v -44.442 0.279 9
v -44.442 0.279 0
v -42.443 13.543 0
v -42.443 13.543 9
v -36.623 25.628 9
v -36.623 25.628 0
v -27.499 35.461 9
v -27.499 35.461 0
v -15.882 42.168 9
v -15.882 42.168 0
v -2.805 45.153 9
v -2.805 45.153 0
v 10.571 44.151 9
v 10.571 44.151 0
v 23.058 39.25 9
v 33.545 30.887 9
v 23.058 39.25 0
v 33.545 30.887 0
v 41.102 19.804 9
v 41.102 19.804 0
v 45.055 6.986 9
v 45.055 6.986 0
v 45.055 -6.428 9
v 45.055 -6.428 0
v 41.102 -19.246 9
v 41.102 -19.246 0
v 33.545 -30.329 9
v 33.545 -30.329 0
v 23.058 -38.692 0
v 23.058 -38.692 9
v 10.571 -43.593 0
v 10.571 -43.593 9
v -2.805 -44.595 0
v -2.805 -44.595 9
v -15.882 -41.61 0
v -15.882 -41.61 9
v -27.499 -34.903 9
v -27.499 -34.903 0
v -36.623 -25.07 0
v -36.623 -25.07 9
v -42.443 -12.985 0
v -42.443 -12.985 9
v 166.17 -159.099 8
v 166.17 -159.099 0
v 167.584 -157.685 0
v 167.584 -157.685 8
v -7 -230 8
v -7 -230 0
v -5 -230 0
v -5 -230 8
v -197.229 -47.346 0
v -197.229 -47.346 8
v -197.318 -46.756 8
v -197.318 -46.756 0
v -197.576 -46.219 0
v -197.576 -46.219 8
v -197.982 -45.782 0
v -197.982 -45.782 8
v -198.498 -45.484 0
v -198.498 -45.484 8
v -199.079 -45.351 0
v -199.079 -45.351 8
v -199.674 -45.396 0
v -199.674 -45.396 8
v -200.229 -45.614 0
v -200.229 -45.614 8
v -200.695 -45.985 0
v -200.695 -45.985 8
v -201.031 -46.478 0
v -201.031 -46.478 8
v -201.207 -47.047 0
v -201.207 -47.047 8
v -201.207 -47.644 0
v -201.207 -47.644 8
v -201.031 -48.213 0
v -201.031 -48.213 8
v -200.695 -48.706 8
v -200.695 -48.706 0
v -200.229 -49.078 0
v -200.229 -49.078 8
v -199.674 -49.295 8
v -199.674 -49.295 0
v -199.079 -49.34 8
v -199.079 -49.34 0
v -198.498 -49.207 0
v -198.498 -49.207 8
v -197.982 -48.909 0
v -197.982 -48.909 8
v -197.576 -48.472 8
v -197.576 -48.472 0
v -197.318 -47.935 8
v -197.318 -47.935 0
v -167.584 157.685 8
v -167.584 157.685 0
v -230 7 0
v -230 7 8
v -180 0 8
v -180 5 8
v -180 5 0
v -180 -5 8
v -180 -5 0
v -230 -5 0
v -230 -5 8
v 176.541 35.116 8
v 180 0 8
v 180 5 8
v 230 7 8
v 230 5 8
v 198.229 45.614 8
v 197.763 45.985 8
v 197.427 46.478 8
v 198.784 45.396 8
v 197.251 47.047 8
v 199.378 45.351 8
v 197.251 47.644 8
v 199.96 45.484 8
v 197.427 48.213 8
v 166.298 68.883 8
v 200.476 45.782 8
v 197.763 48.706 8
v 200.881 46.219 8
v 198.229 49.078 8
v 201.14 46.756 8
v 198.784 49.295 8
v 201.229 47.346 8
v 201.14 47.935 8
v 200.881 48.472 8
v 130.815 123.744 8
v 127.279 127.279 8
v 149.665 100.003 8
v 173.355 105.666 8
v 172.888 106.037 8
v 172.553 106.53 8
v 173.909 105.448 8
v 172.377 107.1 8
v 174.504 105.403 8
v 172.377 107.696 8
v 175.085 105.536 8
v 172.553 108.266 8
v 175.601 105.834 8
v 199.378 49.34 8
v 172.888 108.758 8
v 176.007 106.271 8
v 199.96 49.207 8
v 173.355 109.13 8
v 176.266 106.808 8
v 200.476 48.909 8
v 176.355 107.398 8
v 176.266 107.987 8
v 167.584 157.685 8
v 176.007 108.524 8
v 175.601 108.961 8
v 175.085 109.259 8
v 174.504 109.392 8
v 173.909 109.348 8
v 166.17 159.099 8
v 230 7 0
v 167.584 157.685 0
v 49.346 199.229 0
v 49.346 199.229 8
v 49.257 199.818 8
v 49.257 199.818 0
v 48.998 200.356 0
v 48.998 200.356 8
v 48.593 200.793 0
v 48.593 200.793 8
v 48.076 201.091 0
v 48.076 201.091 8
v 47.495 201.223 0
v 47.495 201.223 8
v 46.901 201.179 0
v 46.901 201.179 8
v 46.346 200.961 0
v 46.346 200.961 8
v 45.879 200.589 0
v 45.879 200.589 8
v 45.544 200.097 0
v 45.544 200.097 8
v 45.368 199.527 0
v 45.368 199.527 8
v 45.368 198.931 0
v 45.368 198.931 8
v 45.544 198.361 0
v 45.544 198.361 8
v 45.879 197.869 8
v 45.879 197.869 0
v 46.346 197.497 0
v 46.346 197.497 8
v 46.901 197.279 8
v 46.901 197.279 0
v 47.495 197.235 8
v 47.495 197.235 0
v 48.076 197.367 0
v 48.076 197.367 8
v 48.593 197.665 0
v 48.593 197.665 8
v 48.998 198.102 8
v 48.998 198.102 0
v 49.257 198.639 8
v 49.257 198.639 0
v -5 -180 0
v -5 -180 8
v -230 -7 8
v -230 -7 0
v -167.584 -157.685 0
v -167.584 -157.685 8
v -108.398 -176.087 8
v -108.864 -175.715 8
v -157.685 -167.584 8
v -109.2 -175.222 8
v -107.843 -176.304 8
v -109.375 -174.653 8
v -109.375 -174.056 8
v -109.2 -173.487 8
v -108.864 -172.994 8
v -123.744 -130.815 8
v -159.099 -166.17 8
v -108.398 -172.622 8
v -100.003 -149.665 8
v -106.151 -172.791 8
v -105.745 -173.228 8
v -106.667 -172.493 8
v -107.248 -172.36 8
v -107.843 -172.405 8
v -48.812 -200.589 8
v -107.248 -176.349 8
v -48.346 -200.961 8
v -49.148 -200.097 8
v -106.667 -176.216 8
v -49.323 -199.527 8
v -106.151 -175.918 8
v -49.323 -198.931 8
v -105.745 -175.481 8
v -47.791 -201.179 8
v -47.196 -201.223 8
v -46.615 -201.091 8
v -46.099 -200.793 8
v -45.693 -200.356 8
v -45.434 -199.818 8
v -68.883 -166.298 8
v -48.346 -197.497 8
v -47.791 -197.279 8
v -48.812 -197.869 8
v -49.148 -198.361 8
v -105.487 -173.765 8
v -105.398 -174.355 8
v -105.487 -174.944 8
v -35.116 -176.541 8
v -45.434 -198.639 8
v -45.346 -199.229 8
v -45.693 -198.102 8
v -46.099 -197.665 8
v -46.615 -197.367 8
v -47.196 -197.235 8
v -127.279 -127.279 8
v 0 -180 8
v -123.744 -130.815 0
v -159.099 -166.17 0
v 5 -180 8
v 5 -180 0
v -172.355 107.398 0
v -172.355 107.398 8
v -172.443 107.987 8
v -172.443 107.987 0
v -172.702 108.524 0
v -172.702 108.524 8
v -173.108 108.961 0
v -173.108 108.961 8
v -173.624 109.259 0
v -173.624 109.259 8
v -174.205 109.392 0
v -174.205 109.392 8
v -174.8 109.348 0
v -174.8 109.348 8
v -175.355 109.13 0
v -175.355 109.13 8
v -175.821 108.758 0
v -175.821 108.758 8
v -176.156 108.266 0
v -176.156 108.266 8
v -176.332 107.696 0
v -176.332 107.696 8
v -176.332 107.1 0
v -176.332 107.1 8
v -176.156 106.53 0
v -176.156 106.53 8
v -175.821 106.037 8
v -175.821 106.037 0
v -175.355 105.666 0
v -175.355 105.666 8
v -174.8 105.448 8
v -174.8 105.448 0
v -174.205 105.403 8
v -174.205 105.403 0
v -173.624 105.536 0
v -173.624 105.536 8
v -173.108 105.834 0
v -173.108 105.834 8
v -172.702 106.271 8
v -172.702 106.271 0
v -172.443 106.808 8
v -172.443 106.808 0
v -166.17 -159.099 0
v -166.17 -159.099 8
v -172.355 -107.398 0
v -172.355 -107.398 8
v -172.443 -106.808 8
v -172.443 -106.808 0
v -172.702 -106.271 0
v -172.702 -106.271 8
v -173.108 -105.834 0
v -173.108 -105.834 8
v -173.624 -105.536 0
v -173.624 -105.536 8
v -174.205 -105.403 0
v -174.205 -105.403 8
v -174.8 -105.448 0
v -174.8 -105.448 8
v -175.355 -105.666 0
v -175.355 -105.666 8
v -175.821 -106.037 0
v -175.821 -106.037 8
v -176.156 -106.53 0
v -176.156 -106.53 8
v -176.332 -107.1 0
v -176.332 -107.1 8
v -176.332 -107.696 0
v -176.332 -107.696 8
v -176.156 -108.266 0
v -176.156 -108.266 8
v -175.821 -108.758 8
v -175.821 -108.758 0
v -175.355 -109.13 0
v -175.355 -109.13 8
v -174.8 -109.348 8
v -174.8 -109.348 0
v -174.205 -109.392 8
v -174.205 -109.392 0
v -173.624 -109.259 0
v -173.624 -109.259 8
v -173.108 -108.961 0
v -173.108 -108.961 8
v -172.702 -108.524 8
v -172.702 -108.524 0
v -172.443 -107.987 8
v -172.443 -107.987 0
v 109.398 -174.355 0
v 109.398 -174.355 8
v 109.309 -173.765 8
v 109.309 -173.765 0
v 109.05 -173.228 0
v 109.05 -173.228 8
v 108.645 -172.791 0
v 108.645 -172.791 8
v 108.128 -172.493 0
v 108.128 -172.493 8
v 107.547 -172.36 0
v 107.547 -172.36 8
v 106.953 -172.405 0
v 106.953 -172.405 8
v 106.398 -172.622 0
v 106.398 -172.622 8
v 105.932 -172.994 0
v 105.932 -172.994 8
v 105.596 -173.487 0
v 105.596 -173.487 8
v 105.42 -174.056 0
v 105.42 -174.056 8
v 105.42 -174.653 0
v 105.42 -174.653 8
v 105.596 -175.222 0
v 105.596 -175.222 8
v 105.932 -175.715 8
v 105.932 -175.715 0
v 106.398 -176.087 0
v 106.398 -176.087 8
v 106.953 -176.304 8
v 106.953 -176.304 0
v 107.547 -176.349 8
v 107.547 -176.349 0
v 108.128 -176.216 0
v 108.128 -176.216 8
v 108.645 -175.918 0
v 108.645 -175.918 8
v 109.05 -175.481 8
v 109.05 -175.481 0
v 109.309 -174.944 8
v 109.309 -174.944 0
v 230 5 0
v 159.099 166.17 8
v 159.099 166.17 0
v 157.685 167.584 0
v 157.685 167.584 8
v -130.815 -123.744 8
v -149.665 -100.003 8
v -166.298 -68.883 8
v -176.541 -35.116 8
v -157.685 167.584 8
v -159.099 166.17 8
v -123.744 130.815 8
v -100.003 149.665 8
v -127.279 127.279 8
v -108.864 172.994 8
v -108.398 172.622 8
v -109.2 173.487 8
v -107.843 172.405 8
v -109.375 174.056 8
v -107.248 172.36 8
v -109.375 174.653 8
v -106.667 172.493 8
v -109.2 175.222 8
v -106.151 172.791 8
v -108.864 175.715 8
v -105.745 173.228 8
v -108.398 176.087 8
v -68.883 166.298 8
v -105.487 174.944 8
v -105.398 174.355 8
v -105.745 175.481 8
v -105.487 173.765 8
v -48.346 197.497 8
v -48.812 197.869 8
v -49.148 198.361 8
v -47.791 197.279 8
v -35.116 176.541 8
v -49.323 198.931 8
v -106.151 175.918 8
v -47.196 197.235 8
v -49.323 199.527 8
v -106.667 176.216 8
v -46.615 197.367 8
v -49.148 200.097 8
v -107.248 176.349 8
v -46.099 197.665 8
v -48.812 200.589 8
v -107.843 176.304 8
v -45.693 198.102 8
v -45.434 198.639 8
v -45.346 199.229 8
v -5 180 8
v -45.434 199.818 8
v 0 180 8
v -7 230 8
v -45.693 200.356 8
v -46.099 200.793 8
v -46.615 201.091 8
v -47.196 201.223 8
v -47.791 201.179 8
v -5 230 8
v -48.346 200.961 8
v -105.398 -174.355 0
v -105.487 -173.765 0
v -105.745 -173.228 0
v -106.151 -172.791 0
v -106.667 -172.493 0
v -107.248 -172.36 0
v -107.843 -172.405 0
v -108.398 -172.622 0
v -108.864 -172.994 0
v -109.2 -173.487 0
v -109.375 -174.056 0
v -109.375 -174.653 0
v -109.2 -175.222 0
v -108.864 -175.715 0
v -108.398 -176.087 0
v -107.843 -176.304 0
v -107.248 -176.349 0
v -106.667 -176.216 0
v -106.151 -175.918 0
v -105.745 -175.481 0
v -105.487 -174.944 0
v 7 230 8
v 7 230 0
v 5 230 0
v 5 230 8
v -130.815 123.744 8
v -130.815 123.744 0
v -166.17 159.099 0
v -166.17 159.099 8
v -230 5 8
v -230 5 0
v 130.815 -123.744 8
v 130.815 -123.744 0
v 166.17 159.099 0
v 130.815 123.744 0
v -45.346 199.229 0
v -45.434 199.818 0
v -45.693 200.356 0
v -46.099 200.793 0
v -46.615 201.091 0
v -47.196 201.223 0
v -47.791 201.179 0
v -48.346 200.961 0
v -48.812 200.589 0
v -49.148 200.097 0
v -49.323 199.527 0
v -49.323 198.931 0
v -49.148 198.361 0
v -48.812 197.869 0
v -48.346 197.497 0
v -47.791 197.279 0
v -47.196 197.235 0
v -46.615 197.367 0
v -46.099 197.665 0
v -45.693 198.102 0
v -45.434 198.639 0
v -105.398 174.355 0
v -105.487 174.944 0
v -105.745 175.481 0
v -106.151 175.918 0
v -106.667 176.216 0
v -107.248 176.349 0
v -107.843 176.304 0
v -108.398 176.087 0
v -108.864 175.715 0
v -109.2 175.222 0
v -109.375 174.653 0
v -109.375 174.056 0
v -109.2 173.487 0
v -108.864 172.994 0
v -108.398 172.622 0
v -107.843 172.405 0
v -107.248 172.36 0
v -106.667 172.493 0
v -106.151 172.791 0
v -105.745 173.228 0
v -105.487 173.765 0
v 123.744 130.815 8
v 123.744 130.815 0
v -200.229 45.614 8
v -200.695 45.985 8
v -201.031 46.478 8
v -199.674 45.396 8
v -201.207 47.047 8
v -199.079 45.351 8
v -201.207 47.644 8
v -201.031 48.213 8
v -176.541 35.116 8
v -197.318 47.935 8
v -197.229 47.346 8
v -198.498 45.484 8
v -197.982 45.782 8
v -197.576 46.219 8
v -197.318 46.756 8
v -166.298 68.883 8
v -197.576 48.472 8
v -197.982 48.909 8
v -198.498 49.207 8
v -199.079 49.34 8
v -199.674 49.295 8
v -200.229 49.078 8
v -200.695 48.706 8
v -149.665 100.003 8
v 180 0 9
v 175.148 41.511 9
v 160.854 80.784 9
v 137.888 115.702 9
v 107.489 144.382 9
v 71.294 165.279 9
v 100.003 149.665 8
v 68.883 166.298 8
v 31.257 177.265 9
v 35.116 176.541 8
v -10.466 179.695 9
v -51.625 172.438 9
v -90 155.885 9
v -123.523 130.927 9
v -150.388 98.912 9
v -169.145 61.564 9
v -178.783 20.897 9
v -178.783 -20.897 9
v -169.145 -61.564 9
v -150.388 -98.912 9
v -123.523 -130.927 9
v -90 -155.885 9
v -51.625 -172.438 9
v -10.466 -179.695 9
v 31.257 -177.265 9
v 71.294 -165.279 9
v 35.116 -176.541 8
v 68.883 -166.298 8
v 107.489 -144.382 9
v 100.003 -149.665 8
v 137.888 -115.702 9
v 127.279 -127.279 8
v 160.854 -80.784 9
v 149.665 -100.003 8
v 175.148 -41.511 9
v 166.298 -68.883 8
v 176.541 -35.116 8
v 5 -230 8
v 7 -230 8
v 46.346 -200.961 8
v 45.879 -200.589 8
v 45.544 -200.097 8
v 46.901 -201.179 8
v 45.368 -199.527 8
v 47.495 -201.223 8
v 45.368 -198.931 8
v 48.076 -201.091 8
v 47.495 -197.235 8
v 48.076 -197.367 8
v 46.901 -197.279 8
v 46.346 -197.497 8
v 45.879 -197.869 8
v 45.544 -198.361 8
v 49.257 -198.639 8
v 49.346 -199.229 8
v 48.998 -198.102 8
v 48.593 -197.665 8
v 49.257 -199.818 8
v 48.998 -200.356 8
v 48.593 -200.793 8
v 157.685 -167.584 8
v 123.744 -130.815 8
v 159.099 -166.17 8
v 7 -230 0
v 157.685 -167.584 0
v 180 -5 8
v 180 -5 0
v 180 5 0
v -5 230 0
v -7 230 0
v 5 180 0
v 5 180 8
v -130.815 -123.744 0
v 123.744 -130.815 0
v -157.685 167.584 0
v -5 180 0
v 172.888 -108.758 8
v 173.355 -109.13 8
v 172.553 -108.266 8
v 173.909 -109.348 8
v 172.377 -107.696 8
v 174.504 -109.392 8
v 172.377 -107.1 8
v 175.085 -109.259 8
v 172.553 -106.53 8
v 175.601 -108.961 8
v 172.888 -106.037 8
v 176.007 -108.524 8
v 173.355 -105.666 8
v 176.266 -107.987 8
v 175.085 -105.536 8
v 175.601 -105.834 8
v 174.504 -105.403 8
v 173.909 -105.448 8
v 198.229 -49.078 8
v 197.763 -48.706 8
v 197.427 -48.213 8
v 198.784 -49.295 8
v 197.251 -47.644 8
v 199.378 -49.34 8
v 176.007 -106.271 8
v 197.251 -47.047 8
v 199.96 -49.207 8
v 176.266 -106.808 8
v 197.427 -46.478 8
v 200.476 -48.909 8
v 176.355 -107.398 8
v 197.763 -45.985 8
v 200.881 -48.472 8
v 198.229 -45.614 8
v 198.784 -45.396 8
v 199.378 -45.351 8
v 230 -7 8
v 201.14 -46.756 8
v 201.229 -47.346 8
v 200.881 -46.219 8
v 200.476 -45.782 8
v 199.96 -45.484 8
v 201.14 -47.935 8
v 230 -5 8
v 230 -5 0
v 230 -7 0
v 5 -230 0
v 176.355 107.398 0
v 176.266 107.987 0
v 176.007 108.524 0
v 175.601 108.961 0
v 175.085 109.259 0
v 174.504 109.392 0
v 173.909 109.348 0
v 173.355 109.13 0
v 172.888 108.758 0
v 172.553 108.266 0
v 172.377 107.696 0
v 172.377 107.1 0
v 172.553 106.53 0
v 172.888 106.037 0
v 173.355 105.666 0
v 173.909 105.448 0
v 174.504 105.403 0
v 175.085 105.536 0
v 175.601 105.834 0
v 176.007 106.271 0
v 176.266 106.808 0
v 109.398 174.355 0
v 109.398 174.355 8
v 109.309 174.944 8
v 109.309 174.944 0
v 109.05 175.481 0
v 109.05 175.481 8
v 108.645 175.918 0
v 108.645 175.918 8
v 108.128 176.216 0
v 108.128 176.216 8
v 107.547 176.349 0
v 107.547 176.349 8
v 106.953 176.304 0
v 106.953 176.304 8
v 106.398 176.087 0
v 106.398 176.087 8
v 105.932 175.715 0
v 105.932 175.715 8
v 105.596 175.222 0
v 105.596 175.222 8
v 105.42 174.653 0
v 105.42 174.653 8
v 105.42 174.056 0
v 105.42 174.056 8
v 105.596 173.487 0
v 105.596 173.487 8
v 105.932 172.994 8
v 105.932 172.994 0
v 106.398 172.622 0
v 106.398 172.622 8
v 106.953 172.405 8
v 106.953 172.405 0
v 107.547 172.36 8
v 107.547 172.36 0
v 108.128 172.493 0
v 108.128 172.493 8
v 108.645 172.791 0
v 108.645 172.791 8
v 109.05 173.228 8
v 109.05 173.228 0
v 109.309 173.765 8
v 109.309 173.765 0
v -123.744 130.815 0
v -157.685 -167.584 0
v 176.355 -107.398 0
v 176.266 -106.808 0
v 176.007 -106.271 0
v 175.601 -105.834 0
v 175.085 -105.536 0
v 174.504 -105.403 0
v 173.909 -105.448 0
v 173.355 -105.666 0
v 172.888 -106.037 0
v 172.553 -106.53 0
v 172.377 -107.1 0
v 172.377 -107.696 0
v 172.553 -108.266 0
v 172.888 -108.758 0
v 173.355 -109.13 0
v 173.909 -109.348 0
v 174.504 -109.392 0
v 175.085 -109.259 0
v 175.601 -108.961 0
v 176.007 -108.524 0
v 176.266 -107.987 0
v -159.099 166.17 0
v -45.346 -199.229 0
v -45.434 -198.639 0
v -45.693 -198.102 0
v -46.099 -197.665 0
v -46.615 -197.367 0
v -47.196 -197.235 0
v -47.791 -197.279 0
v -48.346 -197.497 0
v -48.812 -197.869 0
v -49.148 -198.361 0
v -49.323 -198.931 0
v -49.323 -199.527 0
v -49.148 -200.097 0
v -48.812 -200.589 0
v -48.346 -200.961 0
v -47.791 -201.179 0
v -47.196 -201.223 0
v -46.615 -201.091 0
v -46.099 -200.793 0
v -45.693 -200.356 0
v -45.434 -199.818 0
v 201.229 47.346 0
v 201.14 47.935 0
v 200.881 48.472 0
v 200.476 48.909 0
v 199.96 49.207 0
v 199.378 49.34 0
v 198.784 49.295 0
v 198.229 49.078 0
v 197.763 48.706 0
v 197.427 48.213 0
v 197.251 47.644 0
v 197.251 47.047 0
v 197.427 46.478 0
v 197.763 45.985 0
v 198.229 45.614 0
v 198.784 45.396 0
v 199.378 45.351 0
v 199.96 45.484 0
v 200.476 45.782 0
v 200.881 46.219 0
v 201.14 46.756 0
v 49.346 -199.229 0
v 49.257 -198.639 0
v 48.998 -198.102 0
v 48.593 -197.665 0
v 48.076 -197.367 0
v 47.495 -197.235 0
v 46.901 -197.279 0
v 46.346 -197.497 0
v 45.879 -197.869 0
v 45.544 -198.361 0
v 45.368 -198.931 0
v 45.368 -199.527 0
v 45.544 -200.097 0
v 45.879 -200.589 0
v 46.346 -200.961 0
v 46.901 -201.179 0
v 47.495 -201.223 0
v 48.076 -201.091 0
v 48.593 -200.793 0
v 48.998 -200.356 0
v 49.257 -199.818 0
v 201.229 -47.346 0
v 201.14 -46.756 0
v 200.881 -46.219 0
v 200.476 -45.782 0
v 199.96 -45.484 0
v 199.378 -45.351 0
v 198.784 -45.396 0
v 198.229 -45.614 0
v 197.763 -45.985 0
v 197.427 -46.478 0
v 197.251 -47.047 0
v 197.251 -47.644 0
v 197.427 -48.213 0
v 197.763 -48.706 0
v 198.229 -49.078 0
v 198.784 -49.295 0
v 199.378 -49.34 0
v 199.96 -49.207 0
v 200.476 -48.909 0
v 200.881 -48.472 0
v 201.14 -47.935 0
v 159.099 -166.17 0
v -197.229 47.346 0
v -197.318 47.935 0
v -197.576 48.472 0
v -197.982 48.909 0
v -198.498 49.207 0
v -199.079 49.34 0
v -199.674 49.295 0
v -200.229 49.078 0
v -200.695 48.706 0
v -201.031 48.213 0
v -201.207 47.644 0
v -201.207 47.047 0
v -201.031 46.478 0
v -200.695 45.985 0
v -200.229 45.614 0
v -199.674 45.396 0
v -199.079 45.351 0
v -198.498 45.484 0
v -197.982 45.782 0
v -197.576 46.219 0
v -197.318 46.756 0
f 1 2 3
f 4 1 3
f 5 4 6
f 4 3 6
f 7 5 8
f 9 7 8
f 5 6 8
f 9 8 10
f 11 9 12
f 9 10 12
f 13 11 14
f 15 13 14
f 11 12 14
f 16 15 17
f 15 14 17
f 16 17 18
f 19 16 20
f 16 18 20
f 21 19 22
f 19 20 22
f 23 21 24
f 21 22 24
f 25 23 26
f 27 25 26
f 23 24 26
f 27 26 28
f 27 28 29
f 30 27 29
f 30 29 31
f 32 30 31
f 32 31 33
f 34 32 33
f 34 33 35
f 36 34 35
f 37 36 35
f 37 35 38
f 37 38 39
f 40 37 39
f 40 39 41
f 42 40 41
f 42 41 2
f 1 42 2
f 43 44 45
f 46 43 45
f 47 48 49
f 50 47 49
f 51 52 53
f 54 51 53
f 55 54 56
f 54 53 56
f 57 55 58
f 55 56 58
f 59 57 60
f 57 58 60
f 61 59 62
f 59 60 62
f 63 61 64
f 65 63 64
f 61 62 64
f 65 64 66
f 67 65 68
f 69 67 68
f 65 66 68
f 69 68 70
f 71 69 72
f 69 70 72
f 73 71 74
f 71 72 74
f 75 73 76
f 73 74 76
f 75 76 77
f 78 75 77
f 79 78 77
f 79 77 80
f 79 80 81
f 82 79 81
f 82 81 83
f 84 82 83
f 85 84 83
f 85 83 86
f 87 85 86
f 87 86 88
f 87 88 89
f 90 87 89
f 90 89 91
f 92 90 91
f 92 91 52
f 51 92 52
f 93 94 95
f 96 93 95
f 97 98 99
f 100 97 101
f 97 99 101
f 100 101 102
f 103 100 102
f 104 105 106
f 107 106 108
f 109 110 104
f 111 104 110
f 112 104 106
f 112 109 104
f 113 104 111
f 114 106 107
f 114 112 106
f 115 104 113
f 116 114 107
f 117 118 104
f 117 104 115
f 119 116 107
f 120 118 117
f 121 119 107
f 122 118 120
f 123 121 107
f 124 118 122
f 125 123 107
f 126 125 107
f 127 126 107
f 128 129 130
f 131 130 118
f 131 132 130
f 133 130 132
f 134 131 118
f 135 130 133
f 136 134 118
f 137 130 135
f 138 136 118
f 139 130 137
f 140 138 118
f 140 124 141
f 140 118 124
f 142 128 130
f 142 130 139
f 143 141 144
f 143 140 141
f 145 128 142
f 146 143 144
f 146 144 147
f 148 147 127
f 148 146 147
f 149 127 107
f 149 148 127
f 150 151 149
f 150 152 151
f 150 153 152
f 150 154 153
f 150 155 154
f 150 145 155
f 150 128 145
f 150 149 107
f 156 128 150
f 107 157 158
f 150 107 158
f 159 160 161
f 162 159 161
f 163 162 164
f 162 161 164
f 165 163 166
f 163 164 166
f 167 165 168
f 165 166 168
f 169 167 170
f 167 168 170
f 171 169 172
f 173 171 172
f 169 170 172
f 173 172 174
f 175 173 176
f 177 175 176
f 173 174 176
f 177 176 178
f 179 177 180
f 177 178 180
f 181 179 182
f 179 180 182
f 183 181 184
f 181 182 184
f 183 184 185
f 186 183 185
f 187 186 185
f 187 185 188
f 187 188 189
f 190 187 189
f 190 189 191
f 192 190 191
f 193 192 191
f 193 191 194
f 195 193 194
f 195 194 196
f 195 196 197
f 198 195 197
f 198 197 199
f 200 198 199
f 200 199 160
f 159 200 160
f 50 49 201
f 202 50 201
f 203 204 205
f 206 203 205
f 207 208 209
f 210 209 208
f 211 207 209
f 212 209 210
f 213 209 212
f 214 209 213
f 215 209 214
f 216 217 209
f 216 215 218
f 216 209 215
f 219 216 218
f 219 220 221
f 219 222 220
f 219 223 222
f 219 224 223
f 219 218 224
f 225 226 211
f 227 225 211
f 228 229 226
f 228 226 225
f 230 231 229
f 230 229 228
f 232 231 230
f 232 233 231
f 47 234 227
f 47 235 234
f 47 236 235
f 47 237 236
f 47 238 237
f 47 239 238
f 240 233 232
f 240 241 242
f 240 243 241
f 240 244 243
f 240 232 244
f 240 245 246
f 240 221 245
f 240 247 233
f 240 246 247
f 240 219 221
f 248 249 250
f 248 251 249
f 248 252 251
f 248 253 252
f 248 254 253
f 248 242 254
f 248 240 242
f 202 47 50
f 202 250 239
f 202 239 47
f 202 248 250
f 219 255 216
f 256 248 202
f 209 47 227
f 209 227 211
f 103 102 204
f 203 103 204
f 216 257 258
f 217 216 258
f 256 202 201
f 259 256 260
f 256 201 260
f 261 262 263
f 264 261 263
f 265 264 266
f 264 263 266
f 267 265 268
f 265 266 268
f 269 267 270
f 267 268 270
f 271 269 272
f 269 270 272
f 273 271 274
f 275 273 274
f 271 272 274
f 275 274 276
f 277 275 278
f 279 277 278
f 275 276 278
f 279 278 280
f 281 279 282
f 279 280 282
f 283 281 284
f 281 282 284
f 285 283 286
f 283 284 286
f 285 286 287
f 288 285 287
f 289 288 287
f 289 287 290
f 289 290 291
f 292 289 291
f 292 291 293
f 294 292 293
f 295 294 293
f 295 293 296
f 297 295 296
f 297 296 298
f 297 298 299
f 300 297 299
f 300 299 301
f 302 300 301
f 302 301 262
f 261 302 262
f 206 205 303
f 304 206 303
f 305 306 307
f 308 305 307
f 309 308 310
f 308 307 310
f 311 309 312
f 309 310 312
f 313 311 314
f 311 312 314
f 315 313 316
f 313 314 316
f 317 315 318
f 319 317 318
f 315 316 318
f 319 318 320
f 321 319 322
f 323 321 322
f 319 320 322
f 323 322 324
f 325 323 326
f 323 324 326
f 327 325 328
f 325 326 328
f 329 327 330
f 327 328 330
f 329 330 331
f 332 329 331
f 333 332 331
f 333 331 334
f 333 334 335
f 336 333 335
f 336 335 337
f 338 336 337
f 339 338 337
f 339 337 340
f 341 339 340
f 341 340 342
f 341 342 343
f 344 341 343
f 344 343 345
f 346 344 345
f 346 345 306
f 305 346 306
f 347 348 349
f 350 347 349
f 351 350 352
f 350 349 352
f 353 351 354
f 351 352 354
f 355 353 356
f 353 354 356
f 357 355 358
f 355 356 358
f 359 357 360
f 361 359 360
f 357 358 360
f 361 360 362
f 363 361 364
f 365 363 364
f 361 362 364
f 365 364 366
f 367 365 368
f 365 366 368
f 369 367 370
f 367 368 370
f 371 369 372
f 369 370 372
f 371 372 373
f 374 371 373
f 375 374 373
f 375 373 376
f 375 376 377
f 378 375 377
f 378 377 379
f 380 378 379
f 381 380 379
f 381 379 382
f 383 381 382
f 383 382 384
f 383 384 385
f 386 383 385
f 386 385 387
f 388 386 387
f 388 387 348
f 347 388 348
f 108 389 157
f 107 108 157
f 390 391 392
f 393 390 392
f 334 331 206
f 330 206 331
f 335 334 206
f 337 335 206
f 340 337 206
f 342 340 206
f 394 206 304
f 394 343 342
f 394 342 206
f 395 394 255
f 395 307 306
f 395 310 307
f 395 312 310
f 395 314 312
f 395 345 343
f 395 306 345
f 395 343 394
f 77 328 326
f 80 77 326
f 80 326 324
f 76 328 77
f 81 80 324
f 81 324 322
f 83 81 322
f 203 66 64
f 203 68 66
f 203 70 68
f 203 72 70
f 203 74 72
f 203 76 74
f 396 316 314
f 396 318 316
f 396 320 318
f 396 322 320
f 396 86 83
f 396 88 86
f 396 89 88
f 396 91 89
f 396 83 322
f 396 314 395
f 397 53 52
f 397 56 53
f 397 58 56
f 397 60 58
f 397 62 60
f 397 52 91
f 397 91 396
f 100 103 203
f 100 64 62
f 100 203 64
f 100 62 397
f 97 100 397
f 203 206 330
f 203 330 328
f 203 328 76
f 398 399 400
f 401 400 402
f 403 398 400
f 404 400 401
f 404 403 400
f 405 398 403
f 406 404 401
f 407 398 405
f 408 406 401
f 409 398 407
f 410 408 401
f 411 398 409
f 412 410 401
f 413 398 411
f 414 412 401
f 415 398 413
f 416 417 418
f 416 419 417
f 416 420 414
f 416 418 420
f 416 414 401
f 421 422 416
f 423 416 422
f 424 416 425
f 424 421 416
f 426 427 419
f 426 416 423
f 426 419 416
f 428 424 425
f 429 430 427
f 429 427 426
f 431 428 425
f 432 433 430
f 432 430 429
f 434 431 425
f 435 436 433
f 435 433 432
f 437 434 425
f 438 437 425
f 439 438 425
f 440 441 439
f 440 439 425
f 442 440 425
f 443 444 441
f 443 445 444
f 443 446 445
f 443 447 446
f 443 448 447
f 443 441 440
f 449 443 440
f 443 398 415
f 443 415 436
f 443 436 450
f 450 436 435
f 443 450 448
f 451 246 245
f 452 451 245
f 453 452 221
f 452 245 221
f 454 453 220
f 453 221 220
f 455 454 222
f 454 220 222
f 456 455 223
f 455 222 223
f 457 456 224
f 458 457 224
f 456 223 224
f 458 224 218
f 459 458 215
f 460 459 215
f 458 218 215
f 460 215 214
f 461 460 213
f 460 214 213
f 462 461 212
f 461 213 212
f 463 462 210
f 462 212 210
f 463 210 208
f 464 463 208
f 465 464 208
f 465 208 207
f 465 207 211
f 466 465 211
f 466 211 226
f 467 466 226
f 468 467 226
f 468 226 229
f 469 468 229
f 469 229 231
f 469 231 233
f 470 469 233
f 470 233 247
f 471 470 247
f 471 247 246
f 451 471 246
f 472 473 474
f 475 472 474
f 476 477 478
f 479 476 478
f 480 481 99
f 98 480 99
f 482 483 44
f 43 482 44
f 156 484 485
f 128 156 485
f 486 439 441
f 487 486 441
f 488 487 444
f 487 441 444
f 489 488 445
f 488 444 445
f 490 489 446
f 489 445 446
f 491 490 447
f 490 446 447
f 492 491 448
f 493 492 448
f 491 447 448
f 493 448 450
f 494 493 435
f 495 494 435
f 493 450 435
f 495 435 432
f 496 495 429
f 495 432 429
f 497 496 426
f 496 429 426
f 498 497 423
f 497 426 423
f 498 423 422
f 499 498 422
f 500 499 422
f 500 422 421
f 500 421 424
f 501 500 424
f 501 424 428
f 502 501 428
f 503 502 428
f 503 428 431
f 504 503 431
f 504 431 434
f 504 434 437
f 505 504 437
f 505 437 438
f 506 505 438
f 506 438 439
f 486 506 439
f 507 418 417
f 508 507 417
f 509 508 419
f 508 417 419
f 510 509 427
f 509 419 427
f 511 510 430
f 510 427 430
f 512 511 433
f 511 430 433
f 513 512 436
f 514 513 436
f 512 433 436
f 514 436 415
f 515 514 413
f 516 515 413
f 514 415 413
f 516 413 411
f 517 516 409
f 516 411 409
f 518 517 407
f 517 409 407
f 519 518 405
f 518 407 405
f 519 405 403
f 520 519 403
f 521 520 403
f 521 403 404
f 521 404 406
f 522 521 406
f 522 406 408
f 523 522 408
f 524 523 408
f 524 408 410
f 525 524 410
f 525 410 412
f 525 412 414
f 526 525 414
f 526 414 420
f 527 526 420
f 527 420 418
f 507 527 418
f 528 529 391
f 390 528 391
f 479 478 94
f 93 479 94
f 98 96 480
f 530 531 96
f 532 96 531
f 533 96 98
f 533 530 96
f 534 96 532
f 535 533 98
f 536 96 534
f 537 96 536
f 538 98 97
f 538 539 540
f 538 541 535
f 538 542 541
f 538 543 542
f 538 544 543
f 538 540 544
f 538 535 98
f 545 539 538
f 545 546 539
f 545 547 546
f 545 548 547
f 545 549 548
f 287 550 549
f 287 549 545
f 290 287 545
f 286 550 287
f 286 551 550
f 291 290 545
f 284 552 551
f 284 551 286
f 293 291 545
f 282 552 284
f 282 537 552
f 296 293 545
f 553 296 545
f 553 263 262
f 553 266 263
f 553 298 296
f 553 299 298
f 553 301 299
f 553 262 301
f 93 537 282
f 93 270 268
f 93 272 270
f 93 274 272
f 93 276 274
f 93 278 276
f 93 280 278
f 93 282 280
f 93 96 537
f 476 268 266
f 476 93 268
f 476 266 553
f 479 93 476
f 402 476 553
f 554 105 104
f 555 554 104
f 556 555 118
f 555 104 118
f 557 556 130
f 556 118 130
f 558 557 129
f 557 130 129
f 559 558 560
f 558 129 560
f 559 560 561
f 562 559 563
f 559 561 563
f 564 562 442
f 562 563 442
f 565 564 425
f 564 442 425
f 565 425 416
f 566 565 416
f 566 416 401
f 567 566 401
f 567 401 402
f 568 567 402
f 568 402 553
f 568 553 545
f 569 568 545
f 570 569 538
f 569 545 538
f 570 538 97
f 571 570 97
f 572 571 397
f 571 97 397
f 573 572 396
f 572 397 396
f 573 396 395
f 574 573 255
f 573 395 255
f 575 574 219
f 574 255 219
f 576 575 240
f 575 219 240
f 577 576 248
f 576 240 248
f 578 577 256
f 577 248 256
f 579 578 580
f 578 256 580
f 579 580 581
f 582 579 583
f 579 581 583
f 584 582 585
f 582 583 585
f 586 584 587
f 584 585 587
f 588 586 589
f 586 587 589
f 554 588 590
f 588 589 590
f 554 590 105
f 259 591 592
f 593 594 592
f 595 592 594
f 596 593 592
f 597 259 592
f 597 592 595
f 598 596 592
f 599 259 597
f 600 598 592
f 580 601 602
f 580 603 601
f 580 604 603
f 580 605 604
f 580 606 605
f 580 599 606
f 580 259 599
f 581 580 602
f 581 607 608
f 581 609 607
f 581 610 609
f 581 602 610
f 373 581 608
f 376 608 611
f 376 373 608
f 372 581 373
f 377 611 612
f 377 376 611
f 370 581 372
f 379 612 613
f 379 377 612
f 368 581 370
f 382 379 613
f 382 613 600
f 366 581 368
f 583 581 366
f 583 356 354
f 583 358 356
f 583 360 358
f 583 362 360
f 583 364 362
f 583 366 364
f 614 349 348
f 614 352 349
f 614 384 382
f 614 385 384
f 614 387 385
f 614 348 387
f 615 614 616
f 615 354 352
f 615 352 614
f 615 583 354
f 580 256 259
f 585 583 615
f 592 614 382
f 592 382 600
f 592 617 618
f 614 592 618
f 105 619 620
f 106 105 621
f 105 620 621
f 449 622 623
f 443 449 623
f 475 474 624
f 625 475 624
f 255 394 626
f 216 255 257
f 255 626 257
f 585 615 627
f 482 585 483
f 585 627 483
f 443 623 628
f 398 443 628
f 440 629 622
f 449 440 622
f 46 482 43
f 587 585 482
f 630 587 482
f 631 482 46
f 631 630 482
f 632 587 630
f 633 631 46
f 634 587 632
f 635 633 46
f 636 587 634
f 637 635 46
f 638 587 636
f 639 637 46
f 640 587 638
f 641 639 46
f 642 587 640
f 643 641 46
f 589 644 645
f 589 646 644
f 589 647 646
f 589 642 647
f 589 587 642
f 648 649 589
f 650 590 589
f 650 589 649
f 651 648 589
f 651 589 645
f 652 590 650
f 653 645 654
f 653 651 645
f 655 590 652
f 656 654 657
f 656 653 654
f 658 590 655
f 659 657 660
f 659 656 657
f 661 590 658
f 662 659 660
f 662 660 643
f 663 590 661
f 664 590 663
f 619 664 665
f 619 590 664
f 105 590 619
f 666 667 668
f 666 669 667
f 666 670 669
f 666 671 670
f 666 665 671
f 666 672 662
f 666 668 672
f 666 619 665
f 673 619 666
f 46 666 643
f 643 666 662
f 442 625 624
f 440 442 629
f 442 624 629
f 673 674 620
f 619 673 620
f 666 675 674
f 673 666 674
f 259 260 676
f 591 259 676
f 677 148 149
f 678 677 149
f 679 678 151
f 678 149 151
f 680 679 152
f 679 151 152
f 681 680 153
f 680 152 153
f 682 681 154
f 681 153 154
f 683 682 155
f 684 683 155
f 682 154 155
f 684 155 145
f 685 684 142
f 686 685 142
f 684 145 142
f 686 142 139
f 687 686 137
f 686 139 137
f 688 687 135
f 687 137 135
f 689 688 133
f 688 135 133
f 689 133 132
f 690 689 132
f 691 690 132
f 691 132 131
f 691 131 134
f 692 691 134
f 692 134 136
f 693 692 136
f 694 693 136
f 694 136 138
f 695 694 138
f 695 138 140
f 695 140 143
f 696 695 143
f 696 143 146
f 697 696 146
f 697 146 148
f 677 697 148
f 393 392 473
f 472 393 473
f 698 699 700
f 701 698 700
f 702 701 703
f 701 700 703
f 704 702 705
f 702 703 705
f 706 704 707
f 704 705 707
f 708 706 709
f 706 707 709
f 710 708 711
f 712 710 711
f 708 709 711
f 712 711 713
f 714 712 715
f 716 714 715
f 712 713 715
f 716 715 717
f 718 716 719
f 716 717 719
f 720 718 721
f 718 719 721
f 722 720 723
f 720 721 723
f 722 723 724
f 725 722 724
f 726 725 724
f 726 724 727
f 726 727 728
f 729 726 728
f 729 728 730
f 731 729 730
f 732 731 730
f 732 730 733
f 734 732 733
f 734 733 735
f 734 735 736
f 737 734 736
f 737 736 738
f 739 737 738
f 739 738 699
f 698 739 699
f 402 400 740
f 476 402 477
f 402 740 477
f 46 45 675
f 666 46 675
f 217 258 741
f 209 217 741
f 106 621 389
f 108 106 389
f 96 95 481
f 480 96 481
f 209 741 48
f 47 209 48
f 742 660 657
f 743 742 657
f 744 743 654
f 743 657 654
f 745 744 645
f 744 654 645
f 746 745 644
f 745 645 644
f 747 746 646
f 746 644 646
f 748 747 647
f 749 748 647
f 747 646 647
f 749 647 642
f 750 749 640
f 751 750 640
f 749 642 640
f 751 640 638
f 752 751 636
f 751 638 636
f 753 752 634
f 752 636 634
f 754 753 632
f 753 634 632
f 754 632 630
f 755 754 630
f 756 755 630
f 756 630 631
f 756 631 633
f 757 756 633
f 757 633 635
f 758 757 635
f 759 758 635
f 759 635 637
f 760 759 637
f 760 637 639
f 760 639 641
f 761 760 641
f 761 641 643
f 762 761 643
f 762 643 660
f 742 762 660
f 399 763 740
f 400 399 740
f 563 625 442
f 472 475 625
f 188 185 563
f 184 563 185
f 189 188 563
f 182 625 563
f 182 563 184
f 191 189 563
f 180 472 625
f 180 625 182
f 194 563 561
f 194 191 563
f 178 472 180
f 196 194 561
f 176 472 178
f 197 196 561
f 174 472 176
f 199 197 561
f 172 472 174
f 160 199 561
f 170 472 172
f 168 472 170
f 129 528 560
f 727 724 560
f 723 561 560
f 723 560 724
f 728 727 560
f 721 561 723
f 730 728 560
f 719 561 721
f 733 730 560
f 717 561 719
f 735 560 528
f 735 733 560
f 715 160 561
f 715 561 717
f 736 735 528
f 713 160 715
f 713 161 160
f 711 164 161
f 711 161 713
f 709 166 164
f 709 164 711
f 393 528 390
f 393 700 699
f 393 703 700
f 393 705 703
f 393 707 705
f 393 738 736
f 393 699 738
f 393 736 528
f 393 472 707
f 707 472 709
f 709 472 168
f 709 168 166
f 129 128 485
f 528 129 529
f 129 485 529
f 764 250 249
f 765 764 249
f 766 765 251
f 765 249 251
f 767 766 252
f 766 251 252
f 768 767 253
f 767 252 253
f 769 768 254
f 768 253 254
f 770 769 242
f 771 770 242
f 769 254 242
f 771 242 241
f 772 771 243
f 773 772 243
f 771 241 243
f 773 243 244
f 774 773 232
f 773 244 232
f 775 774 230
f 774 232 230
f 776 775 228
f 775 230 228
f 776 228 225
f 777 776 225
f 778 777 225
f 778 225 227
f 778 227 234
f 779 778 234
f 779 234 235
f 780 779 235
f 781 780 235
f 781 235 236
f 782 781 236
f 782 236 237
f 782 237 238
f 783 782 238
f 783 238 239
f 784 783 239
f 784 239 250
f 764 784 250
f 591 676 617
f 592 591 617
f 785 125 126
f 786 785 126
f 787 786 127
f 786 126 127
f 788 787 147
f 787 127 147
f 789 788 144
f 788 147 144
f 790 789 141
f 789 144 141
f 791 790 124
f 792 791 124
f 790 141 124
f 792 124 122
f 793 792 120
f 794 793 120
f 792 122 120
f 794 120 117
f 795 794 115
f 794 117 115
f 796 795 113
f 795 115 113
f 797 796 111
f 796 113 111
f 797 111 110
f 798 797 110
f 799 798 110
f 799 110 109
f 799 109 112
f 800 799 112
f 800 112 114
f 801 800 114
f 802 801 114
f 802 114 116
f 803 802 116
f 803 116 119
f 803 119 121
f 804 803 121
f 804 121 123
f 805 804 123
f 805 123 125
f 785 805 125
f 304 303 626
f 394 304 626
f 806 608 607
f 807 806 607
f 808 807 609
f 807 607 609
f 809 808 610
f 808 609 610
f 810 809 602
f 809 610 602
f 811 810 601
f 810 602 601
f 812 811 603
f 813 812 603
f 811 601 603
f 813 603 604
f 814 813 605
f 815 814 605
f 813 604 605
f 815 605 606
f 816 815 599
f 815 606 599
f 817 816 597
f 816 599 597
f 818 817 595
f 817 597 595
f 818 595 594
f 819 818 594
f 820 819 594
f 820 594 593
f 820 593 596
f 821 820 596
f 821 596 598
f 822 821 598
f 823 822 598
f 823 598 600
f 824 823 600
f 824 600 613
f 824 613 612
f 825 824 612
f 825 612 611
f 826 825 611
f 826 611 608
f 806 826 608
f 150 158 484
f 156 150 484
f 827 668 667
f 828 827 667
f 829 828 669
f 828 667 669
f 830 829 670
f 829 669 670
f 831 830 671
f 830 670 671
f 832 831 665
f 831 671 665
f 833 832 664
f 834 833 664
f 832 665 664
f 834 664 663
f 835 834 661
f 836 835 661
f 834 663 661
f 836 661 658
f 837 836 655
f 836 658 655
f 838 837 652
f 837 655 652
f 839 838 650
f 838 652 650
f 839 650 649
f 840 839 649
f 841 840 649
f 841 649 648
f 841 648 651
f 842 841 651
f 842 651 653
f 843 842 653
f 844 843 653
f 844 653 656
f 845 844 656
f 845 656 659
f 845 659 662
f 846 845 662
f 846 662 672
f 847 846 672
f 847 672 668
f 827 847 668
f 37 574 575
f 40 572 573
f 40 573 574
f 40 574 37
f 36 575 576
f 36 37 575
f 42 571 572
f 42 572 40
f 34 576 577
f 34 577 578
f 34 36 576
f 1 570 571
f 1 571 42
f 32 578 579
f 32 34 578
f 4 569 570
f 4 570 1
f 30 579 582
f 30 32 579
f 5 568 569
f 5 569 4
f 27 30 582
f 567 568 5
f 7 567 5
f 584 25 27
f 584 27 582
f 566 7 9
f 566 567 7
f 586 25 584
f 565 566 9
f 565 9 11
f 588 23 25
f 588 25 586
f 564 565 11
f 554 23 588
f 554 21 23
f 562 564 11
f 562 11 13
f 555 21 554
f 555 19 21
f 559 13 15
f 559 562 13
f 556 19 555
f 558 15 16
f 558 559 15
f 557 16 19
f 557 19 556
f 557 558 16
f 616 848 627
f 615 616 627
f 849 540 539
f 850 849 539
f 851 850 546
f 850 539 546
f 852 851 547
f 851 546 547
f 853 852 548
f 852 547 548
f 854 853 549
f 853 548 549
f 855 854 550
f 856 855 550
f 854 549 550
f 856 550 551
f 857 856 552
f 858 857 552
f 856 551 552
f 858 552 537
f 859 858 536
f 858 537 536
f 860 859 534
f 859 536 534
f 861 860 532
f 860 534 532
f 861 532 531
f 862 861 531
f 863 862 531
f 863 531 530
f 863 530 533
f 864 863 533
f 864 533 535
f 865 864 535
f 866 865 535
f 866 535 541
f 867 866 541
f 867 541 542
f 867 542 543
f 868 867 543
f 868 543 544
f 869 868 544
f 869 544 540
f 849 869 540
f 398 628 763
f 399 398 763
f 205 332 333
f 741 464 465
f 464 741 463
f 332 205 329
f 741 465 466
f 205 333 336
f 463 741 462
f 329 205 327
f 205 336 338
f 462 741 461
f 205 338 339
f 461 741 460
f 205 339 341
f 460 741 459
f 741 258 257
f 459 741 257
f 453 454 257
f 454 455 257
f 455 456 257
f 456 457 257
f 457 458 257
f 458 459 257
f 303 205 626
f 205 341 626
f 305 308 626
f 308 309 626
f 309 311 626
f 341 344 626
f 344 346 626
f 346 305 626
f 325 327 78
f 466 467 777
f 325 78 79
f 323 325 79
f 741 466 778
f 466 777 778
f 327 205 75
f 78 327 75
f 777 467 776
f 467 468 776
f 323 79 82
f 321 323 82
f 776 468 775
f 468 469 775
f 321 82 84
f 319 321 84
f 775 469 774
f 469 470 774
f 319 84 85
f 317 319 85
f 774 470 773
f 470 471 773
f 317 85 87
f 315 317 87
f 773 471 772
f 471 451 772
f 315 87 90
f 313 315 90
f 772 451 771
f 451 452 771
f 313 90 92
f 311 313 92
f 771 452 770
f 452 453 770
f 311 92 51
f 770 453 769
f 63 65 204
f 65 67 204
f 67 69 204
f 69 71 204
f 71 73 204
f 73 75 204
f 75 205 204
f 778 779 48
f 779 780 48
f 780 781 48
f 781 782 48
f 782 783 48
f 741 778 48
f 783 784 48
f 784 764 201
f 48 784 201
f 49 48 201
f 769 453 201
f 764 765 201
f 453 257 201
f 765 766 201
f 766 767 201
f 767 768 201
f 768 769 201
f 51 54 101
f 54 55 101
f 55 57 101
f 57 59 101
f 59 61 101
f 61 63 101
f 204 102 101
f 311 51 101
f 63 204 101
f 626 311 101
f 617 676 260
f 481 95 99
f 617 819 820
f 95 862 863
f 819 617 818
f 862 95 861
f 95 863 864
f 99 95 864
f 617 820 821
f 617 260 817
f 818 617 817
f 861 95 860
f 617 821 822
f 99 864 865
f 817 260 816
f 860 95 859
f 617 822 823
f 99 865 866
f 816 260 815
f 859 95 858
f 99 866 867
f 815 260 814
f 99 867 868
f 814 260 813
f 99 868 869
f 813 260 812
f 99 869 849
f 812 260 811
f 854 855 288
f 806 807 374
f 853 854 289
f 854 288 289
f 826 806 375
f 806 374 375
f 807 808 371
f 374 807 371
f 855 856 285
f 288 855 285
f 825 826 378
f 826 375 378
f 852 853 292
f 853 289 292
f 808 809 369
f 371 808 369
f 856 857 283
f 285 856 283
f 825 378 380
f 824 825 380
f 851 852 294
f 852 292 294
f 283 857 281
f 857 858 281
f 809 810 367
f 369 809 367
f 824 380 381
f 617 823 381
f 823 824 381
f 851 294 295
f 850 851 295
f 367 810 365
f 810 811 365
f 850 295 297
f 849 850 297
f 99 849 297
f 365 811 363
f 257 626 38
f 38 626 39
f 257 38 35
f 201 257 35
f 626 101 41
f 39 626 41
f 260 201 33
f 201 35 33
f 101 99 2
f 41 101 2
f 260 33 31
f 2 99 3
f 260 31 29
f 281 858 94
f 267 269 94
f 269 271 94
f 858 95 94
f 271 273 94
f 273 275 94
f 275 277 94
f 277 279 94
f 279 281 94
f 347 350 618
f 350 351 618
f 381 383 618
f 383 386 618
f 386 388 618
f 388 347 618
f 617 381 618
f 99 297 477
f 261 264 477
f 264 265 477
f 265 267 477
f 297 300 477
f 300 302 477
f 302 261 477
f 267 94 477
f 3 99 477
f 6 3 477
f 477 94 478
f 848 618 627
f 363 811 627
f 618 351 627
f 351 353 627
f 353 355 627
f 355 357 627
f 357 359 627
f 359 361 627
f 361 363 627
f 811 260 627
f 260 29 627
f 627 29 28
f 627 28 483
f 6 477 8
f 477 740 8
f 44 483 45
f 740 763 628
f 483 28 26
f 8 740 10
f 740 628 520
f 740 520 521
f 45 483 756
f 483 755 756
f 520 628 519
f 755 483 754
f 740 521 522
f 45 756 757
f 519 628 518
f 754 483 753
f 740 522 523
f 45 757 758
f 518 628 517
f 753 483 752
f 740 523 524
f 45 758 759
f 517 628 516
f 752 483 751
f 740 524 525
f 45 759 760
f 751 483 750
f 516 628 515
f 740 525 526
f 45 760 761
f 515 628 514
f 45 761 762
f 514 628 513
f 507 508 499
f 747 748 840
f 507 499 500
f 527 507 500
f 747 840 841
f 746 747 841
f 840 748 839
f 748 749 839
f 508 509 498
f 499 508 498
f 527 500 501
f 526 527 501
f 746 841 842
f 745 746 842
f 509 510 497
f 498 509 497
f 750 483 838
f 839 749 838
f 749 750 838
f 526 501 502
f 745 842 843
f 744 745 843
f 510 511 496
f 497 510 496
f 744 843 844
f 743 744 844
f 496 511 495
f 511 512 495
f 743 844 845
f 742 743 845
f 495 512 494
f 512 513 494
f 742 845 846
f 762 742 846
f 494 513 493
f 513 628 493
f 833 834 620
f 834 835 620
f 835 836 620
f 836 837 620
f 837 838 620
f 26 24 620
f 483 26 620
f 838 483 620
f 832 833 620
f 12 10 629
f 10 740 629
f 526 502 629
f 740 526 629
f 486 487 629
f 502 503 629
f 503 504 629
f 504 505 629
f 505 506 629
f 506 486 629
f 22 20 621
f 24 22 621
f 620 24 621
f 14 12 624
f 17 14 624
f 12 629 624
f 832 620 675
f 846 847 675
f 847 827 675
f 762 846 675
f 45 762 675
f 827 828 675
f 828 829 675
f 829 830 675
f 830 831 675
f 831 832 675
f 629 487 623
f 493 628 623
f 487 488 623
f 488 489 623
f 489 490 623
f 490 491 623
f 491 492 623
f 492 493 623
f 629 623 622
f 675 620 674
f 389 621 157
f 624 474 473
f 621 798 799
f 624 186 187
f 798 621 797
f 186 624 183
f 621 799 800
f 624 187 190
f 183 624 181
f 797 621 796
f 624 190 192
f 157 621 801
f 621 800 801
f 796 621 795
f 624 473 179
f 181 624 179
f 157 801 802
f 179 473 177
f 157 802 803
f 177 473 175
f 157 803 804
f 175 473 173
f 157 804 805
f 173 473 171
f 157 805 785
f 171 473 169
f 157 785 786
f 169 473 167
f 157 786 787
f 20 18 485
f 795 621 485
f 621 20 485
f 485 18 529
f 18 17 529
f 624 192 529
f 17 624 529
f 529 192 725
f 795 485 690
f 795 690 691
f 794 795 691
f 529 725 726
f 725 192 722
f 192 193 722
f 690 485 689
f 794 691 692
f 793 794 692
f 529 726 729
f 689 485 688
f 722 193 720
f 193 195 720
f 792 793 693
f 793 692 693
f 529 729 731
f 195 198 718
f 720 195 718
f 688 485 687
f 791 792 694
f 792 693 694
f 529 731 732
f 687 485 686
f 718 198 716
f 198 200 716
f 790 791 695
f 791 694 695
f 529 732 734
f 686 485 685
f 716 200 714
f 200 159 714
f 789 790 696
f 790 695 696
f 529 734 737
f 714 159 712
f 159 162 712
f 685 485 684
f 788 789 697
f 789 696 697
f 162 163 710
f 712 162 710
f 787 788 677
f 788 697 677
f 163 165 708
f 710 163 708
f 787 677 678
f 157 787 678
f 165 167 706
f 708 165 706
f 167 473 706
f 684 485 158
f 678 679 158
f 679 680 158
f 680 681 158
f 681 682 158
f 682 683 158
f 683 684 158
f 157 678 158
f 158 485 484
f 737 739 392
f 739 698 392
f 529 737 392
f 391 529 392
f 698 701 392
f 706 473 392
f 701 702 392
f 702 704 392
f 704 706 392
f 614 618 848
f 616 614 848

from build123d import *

# Parameters (mm, degrees)
BOSS_EXTRUDE1_DEPTH = 8
SKETCH2_R           = 180
BOSS_EXTRUDE2_DEPTH = 1
CUT_EXTRUDE1_REACH  = 10
SKETCH3_R           = 2
CUT_EXTRUDE2_REACH  = 11
SKETCH4_R           = 45


with BuildPart() as part:
    # Sketch1 → Boss-Extrude1 (new body)
    with BuildSketch(Plane.XY):
        Polygon((5, 230), (5, 180), (-5, 180), (-5, 230), (-7, 230), (-157.684812205, 167.584307141), (-159.099025767, 166.170093579), (-123.743686708, 130.814754519), (-130.81475452, 123.743686708), (-166.170093579, 159.099025767), (-167.584307141, 157.684812205), (-230, 7), (-230, 5), (-180, 5), (-180, -5), (-230, -5), (-230, -7), (-167.584307141, -157.684812205), (-166.170093579, -159.099025767), (-130.81475452, -123.743686708), (-123.743686708, -130.81475452), (-159.099025767, -166.170093579), (-157.684812205, -167.584307141), (-7, -230), (-5, -230), (-5, -180), (5, -180), (5, -230), (7, -230), (157.684812205, -167.584307141), (159.099025767, -166.170093579), (123.743686708, -130.814754519), (130.81475452, -123.743686708), (166.170093579, -159.099025767), (167.584307141, -157.684812205), (230, -7), (230, -5), (180, -5), (180, 5), (230, 5), (230, 7), (167.584307141, 157.684812205), (166.170093579, 159.099025767), (130.81475452, 123.743686708), (123.743686708, 130.81475452), (159.099025767, 166.170093579), (157.684812205, 167.584307141), (7, 230), align=None)
    extrude(amount=BOSS_EXTRUDE1_DEPTH)

    # Sketch2 → Boss-Extrude2 (add)
    with BuildSketch(Plane.XY.offset(8)):
        Circle(SKETCH2_R)
    extrude(amount=BOSS_EXTRUDE2_DEPTH)

    # Sketch3 → Cut-Extrude1 (cut, up to next)
    with BuildSketch(Plane.XY.offset(8), mode=Mode.PRIVATE) as cut_extrude1_sk1:
        with Locations((107.397750993, 174.354514299)):
            Circle(SKETCH3_R)
    cut_extrude1_tool1 = extrude(cut_extrude1_sk1.sketch, amount=-CUT_EXTRUDE1_REACH, mode=Mode.PRIVATE) & part.part
    add(cut_extrude1_tool1.solids().sort_by_distance((107.397751, 174.354514, 8))[0], mode=Mode.SUBTRACT)
    # Sketch3 → Cut-Extrude1 (cut, up to next)
    with BuildSketch(Plane.XY.offset(8), mode=Mode.PRIVATE) as cut_extrude1_sk2:
        with Locations((47.34558138, 199.228937402)):
            Circle(SKETCH3_R)
    cut_extrude1_tool2 = extrude(cut_extrude1_sk2.sketch, amount=-CUT_EXTRUDE1_REACH, mode=Mode.PRIVATE) & part.part
    add(cut_extrude1_tool2.solids().sort_by_distance((47.345581, 199.228937, 8))[0], mode=Mode.SUBTRACT)
    # Sketch3 → Cut-Extrude1 (cut, up to next)
    with BuildSketch(Plane.XY.offset(8), mode=Mode.PRIVATE) as cut_extrude1_sk3:
        with Locations((199.228937402, 47.34558138)):
            Circle(SKETCH3_R)
    cut_extrude1_tool3 = extrude(cut_extrude1_sk3.sketch, amount=-CUT_EXTRUDE1_REACH, mode=Mode.PRIVATE) & part.part
    add(cut_extrude1_tool3.solids().sort_by_distance((199.228937, 47.345581, 8))[0], mode=Mode.SUBTRACT)
    # Sketch3 → Cut-Extrude1 (cut, up to next)
    with BuildSketch(Plane.XY.offset(8), mode=Mode.PRIVATE) as cut_extrude1_sk4:
        with Locations((174.354514299, 107.397750993)):
            Circle(SKETCH3_R)
    cut_extrude1_tool4 = extrude(cut_extrude1_sk4.sketch, amount=-CUT_EXTRUDE1_REACH, mode=Mode.PRIVATE) & part.part
    add(cut_extrude1_tool4.solids().sort_by_distance((174.354514, 107.397751, 8))[0], mode=Mode.SUBTRACT)
    # Sketch3 → Cut-Extrude1 (cut, up to next)
    with BuildSketch(Plane.XY.offset(8), mode=Mode.PRIVATE) as cut_extrude1_sk5:
        with Locations((174.354514299, -107.397750993)):
            Circle(SKETCH3_R)
    cut_extrude1_tool5 = extrude(cut_extrude1_sk5.sketch, amount=-CUT_EXTRUDE1_REACH, mode=Mode.PRIVATE) & part.part
    add(cut_extrude1_tool5.solids().sort_by_distance((174.354514, -107.397751, 8))[0], mode=Mode.SUBTRACT)
    # Sketch3 → Cut-Extrude1 (cut, up to next)
    with BuildSketch(Plane.XY.offset(8), mode=Mode.PRIVATE) as cut_extrude1_sk6:
        with Locations((199.228937402, -47.34558138)):
            Circle(SKETCH3_R)
    cut_extrude1_tool6 = extrude(cut_extrude1_sk6.sketch, amount=-CUT_EXTRUDE1_REACH, mode=Mode.PRIVATE) & part.part
    add(cut_extrude1_tool6.solids().sort_by_distance((199.228937, -47.345581, 8))[0], mode=Mode.SUBTRACT)
    # Sketch3 → Cut-Extrude1 (cut, up to next)
    with BuildSketch(Plane.XY.offset(8), mode=Mode.PRIVATE) as cut_extrude1_sk7:
        with Locations((47.34558138, -199.228937402)):
            Circle(SKETCH3_R)
    cut_extrude1_tool7 = extrude(cut_extrude1_sk7.sketch, amount=-CUT_EXTRUDE1_REACH, mode=Mode.PRIVATE) & part.part
    add(cut_extrude1_tool7.solids().sort_by_distance((47.345581, -199.228937, 8))[0], mode=Mode.SUBTRACT)
    # Sketch3 → Cut-Extrude1 (cut, up to next)
    with BuildSketch(Plane.XY.offset(8), mode=Mode.PRIVATE) as cut_extrude1_sk8:
        with Locations((107.397750993, -174.354514299)):
            Circle(SKETCH3_R)
    cut_extrude1_tool8 = extrude(cut_extrude1_sk8.sketch, amount=-CUT_EXTRUDE1_REACH, mode=Mode.PRIVATE) & part.part
    add(cut_extrude1_tool8.solids().sort_by_distance((107.397751, -174.354514, 8))[0], mode=Mode.SUBTRACT)
    # Sketch3 → Cut-Extrude1 (cut, up to next)
    with BuildSketch(Plane.XY.offset(8), mode=Mode.PRIVATE) as cut_extrude1_sk9:
        with Locations((-107.397750993, -174.354514299)):
            Circle(SKETCH3_R)
    cut_extrude1_tool9 = extrude(cut_extrude1_sk9.sketch, amount=-CUT_EXTRUDE1_REACH, mode=Mode.PRIVATE) & part.part
    add(cut_extrude1_tool9.solids().sort_by_distance((-107.397751, -174.354514, 8))[0], mode=Mode.SUBTRACT)
    # Sketch3 → Cut-Extrude1 (cut, up to next)
    with BuildSketch(Plane.XY.offset(8), mode=Mode.PRIVATE) as cut_extrude1_sk10:
        with Locations((-47.34558138, -199.228937402)):
            Circle(SKETCH3_R)
    cut_extrude1_tool10 = extrude(cut_extrude1_sk10.sketch, amount=-CUT_EXTRUDE1_REACH, mode=Mode.PRIVATE) & part.part
    add(cut_extrude1_tool10.solids().sort_by_distance((-47.345581, -199.228937, 8))[0], mode=Mode.SUBTRACT)
    # Sketch3 → Cut-Extrude1 (cut, up to next)
    with BuildSketch(Plane.XY.offset(8), mode=Mode.PRIVATE) as cut_extrude1_sk11:
        with Locations((-199.228937402, -47.34558138)):
            Circle(SKETCH3_R)
    cut_extrude1_tool11 = extrude(cut_extrude1_sk11.sketch, amount=-CUT_EXTRUDE1_REACH, mode=Mode.PRIVATE) & part.part
    add(cut_extrude1_tool11.solids().sort_by_distance((-199.228937, -47.345581, 8))[0], mode=Mode.SUBTRACT)
    # Sketch3 → Cut-Extrude1 (cut, up to next)
    with BuildSketch(Plane.XY.offset(8), mode=Mode.PRIVATE) as cut_extrude1_sk12:
        with Locations((-174.354514299, -107.397750993)):
            Circle(SKETCH3_R)
    cut_extrude1_tool12 = extrude(cut_extrude1_sk12.sketch, amount=-CUT_EXTRUDE1_REACH, mode=Mode.PRIVATE) & part.part
    add(cut_extrude1_tool12.solids().sort_by_distance((-174.354514, -107.397751, 8))[0], mode=Mode.SUBTRACT)
    # Sketch3 → Cut-Extrude1 (cut, up to next)
    with BuildSketch(Plane.XY.offset(8), mode=Mode.PRIVATE) as cut_extrude1_sk13:
        with Locations((-174.354514299, 107.397750993)):
            Circle(SKETCH3_R)
    cut_extrude1_tool13 = extrude(cut_extrude1_sk13.sketch, amount=-CUT_EXTRUDE1_REACH, mode=Mode.PRIVATE) & part.part
    add(cut_extrude1_tool13.solids().sort_by_distance((-174.354514, 107.397751, 8))[0], mode=Mode.SUBTRACT)
    # Sketch3 → Cut-Extrude1 (cut, up to next)
    with BuildSketch(Plane.XY.offset(8), mode=Mode.PRIVATE) as cut_extrude1_sk14:
        with Locations((-199.228937402, 47.34558138)):
            Circle(SKETCH3_R)
    cut_extrude1_tool14 = extrude(cut_extrude1_sk14.sketch, amount=-CUT_EXTRUDE1_REACH, mode=Mode.PRIVATE) & part.part
    add(cut_extrude1_tool14.solids().sort_by_distance((-199.228937, 47.345581, 8))[0], mode=Mode.SUBTRACT)
    # Sketch3 → Cut-Extrude1 (cut, up to next)
    with BuildSketch(Plane.XY.offset(8), mode=Mode.PRIVATE) as cut_extrude1_sk15:
        with Locations((-47.34558138, 199.228937402)):
            Circle(SKETCH3_R)
    cut_extrude1_tool15 = extrude(cut_extrude1_sk15.sketch, amount=-CUT_EXTRUDE1_REACH, mode=Mode.PRIVATE) & part.part
    add(cut_extrude1_tool15.solids().sort_by_distance((-47.345581, 199.228937, 8))[0], mode=Mode.SUBTRACT)
    # Sketch3 → Cut-Extrude1 (cut, up to next)
    with BuildSketch(Plane.XY.offset(8), mode=Mode.PRIVATE) as cut_extrude1_sk16:
        with Locations((-107.397750993, 174.354514299)):
            Circle(SKETCH3_R)
    cut_extrude1_tool16 = extrude(cut_extrude1_sk16.sketch, amount=-CUT_EXTRUDE1_REACH, mode=Mode.PRIVATE) & part.part
    add(cut_extrude1_tool16.solids().sort_by_distance((-107.397751, 174.354514, 8))[0], mode=Mode.SUBTRACT)

    # Sketch4 → Cut-Extrude2 (cut, up to next)
    with BuildSketch(Plane(origin=(0, 0, 0), x_dir=(-1, 0, 0), z_dir=(0, 0, -1)), mode=Mode.PRIVATE) as cut_extrude2_sk1:
        with Locations((-0.557942617, 0.278971308)):
            Circle(SKETCH4_R)
    cut_extrude2_tool1 = extrude(cut_extrude2_sk1.sketch, amount=-CUT_EXTRUDE2_REACH, mode=Mode.PRIVATE) & part.part
    add(cut_extrude2_tool1.solids().sort_by_distance((0.557943, 0.278971, 0))[0], mode=Mode.SUBTRACT)


solid = part.part
